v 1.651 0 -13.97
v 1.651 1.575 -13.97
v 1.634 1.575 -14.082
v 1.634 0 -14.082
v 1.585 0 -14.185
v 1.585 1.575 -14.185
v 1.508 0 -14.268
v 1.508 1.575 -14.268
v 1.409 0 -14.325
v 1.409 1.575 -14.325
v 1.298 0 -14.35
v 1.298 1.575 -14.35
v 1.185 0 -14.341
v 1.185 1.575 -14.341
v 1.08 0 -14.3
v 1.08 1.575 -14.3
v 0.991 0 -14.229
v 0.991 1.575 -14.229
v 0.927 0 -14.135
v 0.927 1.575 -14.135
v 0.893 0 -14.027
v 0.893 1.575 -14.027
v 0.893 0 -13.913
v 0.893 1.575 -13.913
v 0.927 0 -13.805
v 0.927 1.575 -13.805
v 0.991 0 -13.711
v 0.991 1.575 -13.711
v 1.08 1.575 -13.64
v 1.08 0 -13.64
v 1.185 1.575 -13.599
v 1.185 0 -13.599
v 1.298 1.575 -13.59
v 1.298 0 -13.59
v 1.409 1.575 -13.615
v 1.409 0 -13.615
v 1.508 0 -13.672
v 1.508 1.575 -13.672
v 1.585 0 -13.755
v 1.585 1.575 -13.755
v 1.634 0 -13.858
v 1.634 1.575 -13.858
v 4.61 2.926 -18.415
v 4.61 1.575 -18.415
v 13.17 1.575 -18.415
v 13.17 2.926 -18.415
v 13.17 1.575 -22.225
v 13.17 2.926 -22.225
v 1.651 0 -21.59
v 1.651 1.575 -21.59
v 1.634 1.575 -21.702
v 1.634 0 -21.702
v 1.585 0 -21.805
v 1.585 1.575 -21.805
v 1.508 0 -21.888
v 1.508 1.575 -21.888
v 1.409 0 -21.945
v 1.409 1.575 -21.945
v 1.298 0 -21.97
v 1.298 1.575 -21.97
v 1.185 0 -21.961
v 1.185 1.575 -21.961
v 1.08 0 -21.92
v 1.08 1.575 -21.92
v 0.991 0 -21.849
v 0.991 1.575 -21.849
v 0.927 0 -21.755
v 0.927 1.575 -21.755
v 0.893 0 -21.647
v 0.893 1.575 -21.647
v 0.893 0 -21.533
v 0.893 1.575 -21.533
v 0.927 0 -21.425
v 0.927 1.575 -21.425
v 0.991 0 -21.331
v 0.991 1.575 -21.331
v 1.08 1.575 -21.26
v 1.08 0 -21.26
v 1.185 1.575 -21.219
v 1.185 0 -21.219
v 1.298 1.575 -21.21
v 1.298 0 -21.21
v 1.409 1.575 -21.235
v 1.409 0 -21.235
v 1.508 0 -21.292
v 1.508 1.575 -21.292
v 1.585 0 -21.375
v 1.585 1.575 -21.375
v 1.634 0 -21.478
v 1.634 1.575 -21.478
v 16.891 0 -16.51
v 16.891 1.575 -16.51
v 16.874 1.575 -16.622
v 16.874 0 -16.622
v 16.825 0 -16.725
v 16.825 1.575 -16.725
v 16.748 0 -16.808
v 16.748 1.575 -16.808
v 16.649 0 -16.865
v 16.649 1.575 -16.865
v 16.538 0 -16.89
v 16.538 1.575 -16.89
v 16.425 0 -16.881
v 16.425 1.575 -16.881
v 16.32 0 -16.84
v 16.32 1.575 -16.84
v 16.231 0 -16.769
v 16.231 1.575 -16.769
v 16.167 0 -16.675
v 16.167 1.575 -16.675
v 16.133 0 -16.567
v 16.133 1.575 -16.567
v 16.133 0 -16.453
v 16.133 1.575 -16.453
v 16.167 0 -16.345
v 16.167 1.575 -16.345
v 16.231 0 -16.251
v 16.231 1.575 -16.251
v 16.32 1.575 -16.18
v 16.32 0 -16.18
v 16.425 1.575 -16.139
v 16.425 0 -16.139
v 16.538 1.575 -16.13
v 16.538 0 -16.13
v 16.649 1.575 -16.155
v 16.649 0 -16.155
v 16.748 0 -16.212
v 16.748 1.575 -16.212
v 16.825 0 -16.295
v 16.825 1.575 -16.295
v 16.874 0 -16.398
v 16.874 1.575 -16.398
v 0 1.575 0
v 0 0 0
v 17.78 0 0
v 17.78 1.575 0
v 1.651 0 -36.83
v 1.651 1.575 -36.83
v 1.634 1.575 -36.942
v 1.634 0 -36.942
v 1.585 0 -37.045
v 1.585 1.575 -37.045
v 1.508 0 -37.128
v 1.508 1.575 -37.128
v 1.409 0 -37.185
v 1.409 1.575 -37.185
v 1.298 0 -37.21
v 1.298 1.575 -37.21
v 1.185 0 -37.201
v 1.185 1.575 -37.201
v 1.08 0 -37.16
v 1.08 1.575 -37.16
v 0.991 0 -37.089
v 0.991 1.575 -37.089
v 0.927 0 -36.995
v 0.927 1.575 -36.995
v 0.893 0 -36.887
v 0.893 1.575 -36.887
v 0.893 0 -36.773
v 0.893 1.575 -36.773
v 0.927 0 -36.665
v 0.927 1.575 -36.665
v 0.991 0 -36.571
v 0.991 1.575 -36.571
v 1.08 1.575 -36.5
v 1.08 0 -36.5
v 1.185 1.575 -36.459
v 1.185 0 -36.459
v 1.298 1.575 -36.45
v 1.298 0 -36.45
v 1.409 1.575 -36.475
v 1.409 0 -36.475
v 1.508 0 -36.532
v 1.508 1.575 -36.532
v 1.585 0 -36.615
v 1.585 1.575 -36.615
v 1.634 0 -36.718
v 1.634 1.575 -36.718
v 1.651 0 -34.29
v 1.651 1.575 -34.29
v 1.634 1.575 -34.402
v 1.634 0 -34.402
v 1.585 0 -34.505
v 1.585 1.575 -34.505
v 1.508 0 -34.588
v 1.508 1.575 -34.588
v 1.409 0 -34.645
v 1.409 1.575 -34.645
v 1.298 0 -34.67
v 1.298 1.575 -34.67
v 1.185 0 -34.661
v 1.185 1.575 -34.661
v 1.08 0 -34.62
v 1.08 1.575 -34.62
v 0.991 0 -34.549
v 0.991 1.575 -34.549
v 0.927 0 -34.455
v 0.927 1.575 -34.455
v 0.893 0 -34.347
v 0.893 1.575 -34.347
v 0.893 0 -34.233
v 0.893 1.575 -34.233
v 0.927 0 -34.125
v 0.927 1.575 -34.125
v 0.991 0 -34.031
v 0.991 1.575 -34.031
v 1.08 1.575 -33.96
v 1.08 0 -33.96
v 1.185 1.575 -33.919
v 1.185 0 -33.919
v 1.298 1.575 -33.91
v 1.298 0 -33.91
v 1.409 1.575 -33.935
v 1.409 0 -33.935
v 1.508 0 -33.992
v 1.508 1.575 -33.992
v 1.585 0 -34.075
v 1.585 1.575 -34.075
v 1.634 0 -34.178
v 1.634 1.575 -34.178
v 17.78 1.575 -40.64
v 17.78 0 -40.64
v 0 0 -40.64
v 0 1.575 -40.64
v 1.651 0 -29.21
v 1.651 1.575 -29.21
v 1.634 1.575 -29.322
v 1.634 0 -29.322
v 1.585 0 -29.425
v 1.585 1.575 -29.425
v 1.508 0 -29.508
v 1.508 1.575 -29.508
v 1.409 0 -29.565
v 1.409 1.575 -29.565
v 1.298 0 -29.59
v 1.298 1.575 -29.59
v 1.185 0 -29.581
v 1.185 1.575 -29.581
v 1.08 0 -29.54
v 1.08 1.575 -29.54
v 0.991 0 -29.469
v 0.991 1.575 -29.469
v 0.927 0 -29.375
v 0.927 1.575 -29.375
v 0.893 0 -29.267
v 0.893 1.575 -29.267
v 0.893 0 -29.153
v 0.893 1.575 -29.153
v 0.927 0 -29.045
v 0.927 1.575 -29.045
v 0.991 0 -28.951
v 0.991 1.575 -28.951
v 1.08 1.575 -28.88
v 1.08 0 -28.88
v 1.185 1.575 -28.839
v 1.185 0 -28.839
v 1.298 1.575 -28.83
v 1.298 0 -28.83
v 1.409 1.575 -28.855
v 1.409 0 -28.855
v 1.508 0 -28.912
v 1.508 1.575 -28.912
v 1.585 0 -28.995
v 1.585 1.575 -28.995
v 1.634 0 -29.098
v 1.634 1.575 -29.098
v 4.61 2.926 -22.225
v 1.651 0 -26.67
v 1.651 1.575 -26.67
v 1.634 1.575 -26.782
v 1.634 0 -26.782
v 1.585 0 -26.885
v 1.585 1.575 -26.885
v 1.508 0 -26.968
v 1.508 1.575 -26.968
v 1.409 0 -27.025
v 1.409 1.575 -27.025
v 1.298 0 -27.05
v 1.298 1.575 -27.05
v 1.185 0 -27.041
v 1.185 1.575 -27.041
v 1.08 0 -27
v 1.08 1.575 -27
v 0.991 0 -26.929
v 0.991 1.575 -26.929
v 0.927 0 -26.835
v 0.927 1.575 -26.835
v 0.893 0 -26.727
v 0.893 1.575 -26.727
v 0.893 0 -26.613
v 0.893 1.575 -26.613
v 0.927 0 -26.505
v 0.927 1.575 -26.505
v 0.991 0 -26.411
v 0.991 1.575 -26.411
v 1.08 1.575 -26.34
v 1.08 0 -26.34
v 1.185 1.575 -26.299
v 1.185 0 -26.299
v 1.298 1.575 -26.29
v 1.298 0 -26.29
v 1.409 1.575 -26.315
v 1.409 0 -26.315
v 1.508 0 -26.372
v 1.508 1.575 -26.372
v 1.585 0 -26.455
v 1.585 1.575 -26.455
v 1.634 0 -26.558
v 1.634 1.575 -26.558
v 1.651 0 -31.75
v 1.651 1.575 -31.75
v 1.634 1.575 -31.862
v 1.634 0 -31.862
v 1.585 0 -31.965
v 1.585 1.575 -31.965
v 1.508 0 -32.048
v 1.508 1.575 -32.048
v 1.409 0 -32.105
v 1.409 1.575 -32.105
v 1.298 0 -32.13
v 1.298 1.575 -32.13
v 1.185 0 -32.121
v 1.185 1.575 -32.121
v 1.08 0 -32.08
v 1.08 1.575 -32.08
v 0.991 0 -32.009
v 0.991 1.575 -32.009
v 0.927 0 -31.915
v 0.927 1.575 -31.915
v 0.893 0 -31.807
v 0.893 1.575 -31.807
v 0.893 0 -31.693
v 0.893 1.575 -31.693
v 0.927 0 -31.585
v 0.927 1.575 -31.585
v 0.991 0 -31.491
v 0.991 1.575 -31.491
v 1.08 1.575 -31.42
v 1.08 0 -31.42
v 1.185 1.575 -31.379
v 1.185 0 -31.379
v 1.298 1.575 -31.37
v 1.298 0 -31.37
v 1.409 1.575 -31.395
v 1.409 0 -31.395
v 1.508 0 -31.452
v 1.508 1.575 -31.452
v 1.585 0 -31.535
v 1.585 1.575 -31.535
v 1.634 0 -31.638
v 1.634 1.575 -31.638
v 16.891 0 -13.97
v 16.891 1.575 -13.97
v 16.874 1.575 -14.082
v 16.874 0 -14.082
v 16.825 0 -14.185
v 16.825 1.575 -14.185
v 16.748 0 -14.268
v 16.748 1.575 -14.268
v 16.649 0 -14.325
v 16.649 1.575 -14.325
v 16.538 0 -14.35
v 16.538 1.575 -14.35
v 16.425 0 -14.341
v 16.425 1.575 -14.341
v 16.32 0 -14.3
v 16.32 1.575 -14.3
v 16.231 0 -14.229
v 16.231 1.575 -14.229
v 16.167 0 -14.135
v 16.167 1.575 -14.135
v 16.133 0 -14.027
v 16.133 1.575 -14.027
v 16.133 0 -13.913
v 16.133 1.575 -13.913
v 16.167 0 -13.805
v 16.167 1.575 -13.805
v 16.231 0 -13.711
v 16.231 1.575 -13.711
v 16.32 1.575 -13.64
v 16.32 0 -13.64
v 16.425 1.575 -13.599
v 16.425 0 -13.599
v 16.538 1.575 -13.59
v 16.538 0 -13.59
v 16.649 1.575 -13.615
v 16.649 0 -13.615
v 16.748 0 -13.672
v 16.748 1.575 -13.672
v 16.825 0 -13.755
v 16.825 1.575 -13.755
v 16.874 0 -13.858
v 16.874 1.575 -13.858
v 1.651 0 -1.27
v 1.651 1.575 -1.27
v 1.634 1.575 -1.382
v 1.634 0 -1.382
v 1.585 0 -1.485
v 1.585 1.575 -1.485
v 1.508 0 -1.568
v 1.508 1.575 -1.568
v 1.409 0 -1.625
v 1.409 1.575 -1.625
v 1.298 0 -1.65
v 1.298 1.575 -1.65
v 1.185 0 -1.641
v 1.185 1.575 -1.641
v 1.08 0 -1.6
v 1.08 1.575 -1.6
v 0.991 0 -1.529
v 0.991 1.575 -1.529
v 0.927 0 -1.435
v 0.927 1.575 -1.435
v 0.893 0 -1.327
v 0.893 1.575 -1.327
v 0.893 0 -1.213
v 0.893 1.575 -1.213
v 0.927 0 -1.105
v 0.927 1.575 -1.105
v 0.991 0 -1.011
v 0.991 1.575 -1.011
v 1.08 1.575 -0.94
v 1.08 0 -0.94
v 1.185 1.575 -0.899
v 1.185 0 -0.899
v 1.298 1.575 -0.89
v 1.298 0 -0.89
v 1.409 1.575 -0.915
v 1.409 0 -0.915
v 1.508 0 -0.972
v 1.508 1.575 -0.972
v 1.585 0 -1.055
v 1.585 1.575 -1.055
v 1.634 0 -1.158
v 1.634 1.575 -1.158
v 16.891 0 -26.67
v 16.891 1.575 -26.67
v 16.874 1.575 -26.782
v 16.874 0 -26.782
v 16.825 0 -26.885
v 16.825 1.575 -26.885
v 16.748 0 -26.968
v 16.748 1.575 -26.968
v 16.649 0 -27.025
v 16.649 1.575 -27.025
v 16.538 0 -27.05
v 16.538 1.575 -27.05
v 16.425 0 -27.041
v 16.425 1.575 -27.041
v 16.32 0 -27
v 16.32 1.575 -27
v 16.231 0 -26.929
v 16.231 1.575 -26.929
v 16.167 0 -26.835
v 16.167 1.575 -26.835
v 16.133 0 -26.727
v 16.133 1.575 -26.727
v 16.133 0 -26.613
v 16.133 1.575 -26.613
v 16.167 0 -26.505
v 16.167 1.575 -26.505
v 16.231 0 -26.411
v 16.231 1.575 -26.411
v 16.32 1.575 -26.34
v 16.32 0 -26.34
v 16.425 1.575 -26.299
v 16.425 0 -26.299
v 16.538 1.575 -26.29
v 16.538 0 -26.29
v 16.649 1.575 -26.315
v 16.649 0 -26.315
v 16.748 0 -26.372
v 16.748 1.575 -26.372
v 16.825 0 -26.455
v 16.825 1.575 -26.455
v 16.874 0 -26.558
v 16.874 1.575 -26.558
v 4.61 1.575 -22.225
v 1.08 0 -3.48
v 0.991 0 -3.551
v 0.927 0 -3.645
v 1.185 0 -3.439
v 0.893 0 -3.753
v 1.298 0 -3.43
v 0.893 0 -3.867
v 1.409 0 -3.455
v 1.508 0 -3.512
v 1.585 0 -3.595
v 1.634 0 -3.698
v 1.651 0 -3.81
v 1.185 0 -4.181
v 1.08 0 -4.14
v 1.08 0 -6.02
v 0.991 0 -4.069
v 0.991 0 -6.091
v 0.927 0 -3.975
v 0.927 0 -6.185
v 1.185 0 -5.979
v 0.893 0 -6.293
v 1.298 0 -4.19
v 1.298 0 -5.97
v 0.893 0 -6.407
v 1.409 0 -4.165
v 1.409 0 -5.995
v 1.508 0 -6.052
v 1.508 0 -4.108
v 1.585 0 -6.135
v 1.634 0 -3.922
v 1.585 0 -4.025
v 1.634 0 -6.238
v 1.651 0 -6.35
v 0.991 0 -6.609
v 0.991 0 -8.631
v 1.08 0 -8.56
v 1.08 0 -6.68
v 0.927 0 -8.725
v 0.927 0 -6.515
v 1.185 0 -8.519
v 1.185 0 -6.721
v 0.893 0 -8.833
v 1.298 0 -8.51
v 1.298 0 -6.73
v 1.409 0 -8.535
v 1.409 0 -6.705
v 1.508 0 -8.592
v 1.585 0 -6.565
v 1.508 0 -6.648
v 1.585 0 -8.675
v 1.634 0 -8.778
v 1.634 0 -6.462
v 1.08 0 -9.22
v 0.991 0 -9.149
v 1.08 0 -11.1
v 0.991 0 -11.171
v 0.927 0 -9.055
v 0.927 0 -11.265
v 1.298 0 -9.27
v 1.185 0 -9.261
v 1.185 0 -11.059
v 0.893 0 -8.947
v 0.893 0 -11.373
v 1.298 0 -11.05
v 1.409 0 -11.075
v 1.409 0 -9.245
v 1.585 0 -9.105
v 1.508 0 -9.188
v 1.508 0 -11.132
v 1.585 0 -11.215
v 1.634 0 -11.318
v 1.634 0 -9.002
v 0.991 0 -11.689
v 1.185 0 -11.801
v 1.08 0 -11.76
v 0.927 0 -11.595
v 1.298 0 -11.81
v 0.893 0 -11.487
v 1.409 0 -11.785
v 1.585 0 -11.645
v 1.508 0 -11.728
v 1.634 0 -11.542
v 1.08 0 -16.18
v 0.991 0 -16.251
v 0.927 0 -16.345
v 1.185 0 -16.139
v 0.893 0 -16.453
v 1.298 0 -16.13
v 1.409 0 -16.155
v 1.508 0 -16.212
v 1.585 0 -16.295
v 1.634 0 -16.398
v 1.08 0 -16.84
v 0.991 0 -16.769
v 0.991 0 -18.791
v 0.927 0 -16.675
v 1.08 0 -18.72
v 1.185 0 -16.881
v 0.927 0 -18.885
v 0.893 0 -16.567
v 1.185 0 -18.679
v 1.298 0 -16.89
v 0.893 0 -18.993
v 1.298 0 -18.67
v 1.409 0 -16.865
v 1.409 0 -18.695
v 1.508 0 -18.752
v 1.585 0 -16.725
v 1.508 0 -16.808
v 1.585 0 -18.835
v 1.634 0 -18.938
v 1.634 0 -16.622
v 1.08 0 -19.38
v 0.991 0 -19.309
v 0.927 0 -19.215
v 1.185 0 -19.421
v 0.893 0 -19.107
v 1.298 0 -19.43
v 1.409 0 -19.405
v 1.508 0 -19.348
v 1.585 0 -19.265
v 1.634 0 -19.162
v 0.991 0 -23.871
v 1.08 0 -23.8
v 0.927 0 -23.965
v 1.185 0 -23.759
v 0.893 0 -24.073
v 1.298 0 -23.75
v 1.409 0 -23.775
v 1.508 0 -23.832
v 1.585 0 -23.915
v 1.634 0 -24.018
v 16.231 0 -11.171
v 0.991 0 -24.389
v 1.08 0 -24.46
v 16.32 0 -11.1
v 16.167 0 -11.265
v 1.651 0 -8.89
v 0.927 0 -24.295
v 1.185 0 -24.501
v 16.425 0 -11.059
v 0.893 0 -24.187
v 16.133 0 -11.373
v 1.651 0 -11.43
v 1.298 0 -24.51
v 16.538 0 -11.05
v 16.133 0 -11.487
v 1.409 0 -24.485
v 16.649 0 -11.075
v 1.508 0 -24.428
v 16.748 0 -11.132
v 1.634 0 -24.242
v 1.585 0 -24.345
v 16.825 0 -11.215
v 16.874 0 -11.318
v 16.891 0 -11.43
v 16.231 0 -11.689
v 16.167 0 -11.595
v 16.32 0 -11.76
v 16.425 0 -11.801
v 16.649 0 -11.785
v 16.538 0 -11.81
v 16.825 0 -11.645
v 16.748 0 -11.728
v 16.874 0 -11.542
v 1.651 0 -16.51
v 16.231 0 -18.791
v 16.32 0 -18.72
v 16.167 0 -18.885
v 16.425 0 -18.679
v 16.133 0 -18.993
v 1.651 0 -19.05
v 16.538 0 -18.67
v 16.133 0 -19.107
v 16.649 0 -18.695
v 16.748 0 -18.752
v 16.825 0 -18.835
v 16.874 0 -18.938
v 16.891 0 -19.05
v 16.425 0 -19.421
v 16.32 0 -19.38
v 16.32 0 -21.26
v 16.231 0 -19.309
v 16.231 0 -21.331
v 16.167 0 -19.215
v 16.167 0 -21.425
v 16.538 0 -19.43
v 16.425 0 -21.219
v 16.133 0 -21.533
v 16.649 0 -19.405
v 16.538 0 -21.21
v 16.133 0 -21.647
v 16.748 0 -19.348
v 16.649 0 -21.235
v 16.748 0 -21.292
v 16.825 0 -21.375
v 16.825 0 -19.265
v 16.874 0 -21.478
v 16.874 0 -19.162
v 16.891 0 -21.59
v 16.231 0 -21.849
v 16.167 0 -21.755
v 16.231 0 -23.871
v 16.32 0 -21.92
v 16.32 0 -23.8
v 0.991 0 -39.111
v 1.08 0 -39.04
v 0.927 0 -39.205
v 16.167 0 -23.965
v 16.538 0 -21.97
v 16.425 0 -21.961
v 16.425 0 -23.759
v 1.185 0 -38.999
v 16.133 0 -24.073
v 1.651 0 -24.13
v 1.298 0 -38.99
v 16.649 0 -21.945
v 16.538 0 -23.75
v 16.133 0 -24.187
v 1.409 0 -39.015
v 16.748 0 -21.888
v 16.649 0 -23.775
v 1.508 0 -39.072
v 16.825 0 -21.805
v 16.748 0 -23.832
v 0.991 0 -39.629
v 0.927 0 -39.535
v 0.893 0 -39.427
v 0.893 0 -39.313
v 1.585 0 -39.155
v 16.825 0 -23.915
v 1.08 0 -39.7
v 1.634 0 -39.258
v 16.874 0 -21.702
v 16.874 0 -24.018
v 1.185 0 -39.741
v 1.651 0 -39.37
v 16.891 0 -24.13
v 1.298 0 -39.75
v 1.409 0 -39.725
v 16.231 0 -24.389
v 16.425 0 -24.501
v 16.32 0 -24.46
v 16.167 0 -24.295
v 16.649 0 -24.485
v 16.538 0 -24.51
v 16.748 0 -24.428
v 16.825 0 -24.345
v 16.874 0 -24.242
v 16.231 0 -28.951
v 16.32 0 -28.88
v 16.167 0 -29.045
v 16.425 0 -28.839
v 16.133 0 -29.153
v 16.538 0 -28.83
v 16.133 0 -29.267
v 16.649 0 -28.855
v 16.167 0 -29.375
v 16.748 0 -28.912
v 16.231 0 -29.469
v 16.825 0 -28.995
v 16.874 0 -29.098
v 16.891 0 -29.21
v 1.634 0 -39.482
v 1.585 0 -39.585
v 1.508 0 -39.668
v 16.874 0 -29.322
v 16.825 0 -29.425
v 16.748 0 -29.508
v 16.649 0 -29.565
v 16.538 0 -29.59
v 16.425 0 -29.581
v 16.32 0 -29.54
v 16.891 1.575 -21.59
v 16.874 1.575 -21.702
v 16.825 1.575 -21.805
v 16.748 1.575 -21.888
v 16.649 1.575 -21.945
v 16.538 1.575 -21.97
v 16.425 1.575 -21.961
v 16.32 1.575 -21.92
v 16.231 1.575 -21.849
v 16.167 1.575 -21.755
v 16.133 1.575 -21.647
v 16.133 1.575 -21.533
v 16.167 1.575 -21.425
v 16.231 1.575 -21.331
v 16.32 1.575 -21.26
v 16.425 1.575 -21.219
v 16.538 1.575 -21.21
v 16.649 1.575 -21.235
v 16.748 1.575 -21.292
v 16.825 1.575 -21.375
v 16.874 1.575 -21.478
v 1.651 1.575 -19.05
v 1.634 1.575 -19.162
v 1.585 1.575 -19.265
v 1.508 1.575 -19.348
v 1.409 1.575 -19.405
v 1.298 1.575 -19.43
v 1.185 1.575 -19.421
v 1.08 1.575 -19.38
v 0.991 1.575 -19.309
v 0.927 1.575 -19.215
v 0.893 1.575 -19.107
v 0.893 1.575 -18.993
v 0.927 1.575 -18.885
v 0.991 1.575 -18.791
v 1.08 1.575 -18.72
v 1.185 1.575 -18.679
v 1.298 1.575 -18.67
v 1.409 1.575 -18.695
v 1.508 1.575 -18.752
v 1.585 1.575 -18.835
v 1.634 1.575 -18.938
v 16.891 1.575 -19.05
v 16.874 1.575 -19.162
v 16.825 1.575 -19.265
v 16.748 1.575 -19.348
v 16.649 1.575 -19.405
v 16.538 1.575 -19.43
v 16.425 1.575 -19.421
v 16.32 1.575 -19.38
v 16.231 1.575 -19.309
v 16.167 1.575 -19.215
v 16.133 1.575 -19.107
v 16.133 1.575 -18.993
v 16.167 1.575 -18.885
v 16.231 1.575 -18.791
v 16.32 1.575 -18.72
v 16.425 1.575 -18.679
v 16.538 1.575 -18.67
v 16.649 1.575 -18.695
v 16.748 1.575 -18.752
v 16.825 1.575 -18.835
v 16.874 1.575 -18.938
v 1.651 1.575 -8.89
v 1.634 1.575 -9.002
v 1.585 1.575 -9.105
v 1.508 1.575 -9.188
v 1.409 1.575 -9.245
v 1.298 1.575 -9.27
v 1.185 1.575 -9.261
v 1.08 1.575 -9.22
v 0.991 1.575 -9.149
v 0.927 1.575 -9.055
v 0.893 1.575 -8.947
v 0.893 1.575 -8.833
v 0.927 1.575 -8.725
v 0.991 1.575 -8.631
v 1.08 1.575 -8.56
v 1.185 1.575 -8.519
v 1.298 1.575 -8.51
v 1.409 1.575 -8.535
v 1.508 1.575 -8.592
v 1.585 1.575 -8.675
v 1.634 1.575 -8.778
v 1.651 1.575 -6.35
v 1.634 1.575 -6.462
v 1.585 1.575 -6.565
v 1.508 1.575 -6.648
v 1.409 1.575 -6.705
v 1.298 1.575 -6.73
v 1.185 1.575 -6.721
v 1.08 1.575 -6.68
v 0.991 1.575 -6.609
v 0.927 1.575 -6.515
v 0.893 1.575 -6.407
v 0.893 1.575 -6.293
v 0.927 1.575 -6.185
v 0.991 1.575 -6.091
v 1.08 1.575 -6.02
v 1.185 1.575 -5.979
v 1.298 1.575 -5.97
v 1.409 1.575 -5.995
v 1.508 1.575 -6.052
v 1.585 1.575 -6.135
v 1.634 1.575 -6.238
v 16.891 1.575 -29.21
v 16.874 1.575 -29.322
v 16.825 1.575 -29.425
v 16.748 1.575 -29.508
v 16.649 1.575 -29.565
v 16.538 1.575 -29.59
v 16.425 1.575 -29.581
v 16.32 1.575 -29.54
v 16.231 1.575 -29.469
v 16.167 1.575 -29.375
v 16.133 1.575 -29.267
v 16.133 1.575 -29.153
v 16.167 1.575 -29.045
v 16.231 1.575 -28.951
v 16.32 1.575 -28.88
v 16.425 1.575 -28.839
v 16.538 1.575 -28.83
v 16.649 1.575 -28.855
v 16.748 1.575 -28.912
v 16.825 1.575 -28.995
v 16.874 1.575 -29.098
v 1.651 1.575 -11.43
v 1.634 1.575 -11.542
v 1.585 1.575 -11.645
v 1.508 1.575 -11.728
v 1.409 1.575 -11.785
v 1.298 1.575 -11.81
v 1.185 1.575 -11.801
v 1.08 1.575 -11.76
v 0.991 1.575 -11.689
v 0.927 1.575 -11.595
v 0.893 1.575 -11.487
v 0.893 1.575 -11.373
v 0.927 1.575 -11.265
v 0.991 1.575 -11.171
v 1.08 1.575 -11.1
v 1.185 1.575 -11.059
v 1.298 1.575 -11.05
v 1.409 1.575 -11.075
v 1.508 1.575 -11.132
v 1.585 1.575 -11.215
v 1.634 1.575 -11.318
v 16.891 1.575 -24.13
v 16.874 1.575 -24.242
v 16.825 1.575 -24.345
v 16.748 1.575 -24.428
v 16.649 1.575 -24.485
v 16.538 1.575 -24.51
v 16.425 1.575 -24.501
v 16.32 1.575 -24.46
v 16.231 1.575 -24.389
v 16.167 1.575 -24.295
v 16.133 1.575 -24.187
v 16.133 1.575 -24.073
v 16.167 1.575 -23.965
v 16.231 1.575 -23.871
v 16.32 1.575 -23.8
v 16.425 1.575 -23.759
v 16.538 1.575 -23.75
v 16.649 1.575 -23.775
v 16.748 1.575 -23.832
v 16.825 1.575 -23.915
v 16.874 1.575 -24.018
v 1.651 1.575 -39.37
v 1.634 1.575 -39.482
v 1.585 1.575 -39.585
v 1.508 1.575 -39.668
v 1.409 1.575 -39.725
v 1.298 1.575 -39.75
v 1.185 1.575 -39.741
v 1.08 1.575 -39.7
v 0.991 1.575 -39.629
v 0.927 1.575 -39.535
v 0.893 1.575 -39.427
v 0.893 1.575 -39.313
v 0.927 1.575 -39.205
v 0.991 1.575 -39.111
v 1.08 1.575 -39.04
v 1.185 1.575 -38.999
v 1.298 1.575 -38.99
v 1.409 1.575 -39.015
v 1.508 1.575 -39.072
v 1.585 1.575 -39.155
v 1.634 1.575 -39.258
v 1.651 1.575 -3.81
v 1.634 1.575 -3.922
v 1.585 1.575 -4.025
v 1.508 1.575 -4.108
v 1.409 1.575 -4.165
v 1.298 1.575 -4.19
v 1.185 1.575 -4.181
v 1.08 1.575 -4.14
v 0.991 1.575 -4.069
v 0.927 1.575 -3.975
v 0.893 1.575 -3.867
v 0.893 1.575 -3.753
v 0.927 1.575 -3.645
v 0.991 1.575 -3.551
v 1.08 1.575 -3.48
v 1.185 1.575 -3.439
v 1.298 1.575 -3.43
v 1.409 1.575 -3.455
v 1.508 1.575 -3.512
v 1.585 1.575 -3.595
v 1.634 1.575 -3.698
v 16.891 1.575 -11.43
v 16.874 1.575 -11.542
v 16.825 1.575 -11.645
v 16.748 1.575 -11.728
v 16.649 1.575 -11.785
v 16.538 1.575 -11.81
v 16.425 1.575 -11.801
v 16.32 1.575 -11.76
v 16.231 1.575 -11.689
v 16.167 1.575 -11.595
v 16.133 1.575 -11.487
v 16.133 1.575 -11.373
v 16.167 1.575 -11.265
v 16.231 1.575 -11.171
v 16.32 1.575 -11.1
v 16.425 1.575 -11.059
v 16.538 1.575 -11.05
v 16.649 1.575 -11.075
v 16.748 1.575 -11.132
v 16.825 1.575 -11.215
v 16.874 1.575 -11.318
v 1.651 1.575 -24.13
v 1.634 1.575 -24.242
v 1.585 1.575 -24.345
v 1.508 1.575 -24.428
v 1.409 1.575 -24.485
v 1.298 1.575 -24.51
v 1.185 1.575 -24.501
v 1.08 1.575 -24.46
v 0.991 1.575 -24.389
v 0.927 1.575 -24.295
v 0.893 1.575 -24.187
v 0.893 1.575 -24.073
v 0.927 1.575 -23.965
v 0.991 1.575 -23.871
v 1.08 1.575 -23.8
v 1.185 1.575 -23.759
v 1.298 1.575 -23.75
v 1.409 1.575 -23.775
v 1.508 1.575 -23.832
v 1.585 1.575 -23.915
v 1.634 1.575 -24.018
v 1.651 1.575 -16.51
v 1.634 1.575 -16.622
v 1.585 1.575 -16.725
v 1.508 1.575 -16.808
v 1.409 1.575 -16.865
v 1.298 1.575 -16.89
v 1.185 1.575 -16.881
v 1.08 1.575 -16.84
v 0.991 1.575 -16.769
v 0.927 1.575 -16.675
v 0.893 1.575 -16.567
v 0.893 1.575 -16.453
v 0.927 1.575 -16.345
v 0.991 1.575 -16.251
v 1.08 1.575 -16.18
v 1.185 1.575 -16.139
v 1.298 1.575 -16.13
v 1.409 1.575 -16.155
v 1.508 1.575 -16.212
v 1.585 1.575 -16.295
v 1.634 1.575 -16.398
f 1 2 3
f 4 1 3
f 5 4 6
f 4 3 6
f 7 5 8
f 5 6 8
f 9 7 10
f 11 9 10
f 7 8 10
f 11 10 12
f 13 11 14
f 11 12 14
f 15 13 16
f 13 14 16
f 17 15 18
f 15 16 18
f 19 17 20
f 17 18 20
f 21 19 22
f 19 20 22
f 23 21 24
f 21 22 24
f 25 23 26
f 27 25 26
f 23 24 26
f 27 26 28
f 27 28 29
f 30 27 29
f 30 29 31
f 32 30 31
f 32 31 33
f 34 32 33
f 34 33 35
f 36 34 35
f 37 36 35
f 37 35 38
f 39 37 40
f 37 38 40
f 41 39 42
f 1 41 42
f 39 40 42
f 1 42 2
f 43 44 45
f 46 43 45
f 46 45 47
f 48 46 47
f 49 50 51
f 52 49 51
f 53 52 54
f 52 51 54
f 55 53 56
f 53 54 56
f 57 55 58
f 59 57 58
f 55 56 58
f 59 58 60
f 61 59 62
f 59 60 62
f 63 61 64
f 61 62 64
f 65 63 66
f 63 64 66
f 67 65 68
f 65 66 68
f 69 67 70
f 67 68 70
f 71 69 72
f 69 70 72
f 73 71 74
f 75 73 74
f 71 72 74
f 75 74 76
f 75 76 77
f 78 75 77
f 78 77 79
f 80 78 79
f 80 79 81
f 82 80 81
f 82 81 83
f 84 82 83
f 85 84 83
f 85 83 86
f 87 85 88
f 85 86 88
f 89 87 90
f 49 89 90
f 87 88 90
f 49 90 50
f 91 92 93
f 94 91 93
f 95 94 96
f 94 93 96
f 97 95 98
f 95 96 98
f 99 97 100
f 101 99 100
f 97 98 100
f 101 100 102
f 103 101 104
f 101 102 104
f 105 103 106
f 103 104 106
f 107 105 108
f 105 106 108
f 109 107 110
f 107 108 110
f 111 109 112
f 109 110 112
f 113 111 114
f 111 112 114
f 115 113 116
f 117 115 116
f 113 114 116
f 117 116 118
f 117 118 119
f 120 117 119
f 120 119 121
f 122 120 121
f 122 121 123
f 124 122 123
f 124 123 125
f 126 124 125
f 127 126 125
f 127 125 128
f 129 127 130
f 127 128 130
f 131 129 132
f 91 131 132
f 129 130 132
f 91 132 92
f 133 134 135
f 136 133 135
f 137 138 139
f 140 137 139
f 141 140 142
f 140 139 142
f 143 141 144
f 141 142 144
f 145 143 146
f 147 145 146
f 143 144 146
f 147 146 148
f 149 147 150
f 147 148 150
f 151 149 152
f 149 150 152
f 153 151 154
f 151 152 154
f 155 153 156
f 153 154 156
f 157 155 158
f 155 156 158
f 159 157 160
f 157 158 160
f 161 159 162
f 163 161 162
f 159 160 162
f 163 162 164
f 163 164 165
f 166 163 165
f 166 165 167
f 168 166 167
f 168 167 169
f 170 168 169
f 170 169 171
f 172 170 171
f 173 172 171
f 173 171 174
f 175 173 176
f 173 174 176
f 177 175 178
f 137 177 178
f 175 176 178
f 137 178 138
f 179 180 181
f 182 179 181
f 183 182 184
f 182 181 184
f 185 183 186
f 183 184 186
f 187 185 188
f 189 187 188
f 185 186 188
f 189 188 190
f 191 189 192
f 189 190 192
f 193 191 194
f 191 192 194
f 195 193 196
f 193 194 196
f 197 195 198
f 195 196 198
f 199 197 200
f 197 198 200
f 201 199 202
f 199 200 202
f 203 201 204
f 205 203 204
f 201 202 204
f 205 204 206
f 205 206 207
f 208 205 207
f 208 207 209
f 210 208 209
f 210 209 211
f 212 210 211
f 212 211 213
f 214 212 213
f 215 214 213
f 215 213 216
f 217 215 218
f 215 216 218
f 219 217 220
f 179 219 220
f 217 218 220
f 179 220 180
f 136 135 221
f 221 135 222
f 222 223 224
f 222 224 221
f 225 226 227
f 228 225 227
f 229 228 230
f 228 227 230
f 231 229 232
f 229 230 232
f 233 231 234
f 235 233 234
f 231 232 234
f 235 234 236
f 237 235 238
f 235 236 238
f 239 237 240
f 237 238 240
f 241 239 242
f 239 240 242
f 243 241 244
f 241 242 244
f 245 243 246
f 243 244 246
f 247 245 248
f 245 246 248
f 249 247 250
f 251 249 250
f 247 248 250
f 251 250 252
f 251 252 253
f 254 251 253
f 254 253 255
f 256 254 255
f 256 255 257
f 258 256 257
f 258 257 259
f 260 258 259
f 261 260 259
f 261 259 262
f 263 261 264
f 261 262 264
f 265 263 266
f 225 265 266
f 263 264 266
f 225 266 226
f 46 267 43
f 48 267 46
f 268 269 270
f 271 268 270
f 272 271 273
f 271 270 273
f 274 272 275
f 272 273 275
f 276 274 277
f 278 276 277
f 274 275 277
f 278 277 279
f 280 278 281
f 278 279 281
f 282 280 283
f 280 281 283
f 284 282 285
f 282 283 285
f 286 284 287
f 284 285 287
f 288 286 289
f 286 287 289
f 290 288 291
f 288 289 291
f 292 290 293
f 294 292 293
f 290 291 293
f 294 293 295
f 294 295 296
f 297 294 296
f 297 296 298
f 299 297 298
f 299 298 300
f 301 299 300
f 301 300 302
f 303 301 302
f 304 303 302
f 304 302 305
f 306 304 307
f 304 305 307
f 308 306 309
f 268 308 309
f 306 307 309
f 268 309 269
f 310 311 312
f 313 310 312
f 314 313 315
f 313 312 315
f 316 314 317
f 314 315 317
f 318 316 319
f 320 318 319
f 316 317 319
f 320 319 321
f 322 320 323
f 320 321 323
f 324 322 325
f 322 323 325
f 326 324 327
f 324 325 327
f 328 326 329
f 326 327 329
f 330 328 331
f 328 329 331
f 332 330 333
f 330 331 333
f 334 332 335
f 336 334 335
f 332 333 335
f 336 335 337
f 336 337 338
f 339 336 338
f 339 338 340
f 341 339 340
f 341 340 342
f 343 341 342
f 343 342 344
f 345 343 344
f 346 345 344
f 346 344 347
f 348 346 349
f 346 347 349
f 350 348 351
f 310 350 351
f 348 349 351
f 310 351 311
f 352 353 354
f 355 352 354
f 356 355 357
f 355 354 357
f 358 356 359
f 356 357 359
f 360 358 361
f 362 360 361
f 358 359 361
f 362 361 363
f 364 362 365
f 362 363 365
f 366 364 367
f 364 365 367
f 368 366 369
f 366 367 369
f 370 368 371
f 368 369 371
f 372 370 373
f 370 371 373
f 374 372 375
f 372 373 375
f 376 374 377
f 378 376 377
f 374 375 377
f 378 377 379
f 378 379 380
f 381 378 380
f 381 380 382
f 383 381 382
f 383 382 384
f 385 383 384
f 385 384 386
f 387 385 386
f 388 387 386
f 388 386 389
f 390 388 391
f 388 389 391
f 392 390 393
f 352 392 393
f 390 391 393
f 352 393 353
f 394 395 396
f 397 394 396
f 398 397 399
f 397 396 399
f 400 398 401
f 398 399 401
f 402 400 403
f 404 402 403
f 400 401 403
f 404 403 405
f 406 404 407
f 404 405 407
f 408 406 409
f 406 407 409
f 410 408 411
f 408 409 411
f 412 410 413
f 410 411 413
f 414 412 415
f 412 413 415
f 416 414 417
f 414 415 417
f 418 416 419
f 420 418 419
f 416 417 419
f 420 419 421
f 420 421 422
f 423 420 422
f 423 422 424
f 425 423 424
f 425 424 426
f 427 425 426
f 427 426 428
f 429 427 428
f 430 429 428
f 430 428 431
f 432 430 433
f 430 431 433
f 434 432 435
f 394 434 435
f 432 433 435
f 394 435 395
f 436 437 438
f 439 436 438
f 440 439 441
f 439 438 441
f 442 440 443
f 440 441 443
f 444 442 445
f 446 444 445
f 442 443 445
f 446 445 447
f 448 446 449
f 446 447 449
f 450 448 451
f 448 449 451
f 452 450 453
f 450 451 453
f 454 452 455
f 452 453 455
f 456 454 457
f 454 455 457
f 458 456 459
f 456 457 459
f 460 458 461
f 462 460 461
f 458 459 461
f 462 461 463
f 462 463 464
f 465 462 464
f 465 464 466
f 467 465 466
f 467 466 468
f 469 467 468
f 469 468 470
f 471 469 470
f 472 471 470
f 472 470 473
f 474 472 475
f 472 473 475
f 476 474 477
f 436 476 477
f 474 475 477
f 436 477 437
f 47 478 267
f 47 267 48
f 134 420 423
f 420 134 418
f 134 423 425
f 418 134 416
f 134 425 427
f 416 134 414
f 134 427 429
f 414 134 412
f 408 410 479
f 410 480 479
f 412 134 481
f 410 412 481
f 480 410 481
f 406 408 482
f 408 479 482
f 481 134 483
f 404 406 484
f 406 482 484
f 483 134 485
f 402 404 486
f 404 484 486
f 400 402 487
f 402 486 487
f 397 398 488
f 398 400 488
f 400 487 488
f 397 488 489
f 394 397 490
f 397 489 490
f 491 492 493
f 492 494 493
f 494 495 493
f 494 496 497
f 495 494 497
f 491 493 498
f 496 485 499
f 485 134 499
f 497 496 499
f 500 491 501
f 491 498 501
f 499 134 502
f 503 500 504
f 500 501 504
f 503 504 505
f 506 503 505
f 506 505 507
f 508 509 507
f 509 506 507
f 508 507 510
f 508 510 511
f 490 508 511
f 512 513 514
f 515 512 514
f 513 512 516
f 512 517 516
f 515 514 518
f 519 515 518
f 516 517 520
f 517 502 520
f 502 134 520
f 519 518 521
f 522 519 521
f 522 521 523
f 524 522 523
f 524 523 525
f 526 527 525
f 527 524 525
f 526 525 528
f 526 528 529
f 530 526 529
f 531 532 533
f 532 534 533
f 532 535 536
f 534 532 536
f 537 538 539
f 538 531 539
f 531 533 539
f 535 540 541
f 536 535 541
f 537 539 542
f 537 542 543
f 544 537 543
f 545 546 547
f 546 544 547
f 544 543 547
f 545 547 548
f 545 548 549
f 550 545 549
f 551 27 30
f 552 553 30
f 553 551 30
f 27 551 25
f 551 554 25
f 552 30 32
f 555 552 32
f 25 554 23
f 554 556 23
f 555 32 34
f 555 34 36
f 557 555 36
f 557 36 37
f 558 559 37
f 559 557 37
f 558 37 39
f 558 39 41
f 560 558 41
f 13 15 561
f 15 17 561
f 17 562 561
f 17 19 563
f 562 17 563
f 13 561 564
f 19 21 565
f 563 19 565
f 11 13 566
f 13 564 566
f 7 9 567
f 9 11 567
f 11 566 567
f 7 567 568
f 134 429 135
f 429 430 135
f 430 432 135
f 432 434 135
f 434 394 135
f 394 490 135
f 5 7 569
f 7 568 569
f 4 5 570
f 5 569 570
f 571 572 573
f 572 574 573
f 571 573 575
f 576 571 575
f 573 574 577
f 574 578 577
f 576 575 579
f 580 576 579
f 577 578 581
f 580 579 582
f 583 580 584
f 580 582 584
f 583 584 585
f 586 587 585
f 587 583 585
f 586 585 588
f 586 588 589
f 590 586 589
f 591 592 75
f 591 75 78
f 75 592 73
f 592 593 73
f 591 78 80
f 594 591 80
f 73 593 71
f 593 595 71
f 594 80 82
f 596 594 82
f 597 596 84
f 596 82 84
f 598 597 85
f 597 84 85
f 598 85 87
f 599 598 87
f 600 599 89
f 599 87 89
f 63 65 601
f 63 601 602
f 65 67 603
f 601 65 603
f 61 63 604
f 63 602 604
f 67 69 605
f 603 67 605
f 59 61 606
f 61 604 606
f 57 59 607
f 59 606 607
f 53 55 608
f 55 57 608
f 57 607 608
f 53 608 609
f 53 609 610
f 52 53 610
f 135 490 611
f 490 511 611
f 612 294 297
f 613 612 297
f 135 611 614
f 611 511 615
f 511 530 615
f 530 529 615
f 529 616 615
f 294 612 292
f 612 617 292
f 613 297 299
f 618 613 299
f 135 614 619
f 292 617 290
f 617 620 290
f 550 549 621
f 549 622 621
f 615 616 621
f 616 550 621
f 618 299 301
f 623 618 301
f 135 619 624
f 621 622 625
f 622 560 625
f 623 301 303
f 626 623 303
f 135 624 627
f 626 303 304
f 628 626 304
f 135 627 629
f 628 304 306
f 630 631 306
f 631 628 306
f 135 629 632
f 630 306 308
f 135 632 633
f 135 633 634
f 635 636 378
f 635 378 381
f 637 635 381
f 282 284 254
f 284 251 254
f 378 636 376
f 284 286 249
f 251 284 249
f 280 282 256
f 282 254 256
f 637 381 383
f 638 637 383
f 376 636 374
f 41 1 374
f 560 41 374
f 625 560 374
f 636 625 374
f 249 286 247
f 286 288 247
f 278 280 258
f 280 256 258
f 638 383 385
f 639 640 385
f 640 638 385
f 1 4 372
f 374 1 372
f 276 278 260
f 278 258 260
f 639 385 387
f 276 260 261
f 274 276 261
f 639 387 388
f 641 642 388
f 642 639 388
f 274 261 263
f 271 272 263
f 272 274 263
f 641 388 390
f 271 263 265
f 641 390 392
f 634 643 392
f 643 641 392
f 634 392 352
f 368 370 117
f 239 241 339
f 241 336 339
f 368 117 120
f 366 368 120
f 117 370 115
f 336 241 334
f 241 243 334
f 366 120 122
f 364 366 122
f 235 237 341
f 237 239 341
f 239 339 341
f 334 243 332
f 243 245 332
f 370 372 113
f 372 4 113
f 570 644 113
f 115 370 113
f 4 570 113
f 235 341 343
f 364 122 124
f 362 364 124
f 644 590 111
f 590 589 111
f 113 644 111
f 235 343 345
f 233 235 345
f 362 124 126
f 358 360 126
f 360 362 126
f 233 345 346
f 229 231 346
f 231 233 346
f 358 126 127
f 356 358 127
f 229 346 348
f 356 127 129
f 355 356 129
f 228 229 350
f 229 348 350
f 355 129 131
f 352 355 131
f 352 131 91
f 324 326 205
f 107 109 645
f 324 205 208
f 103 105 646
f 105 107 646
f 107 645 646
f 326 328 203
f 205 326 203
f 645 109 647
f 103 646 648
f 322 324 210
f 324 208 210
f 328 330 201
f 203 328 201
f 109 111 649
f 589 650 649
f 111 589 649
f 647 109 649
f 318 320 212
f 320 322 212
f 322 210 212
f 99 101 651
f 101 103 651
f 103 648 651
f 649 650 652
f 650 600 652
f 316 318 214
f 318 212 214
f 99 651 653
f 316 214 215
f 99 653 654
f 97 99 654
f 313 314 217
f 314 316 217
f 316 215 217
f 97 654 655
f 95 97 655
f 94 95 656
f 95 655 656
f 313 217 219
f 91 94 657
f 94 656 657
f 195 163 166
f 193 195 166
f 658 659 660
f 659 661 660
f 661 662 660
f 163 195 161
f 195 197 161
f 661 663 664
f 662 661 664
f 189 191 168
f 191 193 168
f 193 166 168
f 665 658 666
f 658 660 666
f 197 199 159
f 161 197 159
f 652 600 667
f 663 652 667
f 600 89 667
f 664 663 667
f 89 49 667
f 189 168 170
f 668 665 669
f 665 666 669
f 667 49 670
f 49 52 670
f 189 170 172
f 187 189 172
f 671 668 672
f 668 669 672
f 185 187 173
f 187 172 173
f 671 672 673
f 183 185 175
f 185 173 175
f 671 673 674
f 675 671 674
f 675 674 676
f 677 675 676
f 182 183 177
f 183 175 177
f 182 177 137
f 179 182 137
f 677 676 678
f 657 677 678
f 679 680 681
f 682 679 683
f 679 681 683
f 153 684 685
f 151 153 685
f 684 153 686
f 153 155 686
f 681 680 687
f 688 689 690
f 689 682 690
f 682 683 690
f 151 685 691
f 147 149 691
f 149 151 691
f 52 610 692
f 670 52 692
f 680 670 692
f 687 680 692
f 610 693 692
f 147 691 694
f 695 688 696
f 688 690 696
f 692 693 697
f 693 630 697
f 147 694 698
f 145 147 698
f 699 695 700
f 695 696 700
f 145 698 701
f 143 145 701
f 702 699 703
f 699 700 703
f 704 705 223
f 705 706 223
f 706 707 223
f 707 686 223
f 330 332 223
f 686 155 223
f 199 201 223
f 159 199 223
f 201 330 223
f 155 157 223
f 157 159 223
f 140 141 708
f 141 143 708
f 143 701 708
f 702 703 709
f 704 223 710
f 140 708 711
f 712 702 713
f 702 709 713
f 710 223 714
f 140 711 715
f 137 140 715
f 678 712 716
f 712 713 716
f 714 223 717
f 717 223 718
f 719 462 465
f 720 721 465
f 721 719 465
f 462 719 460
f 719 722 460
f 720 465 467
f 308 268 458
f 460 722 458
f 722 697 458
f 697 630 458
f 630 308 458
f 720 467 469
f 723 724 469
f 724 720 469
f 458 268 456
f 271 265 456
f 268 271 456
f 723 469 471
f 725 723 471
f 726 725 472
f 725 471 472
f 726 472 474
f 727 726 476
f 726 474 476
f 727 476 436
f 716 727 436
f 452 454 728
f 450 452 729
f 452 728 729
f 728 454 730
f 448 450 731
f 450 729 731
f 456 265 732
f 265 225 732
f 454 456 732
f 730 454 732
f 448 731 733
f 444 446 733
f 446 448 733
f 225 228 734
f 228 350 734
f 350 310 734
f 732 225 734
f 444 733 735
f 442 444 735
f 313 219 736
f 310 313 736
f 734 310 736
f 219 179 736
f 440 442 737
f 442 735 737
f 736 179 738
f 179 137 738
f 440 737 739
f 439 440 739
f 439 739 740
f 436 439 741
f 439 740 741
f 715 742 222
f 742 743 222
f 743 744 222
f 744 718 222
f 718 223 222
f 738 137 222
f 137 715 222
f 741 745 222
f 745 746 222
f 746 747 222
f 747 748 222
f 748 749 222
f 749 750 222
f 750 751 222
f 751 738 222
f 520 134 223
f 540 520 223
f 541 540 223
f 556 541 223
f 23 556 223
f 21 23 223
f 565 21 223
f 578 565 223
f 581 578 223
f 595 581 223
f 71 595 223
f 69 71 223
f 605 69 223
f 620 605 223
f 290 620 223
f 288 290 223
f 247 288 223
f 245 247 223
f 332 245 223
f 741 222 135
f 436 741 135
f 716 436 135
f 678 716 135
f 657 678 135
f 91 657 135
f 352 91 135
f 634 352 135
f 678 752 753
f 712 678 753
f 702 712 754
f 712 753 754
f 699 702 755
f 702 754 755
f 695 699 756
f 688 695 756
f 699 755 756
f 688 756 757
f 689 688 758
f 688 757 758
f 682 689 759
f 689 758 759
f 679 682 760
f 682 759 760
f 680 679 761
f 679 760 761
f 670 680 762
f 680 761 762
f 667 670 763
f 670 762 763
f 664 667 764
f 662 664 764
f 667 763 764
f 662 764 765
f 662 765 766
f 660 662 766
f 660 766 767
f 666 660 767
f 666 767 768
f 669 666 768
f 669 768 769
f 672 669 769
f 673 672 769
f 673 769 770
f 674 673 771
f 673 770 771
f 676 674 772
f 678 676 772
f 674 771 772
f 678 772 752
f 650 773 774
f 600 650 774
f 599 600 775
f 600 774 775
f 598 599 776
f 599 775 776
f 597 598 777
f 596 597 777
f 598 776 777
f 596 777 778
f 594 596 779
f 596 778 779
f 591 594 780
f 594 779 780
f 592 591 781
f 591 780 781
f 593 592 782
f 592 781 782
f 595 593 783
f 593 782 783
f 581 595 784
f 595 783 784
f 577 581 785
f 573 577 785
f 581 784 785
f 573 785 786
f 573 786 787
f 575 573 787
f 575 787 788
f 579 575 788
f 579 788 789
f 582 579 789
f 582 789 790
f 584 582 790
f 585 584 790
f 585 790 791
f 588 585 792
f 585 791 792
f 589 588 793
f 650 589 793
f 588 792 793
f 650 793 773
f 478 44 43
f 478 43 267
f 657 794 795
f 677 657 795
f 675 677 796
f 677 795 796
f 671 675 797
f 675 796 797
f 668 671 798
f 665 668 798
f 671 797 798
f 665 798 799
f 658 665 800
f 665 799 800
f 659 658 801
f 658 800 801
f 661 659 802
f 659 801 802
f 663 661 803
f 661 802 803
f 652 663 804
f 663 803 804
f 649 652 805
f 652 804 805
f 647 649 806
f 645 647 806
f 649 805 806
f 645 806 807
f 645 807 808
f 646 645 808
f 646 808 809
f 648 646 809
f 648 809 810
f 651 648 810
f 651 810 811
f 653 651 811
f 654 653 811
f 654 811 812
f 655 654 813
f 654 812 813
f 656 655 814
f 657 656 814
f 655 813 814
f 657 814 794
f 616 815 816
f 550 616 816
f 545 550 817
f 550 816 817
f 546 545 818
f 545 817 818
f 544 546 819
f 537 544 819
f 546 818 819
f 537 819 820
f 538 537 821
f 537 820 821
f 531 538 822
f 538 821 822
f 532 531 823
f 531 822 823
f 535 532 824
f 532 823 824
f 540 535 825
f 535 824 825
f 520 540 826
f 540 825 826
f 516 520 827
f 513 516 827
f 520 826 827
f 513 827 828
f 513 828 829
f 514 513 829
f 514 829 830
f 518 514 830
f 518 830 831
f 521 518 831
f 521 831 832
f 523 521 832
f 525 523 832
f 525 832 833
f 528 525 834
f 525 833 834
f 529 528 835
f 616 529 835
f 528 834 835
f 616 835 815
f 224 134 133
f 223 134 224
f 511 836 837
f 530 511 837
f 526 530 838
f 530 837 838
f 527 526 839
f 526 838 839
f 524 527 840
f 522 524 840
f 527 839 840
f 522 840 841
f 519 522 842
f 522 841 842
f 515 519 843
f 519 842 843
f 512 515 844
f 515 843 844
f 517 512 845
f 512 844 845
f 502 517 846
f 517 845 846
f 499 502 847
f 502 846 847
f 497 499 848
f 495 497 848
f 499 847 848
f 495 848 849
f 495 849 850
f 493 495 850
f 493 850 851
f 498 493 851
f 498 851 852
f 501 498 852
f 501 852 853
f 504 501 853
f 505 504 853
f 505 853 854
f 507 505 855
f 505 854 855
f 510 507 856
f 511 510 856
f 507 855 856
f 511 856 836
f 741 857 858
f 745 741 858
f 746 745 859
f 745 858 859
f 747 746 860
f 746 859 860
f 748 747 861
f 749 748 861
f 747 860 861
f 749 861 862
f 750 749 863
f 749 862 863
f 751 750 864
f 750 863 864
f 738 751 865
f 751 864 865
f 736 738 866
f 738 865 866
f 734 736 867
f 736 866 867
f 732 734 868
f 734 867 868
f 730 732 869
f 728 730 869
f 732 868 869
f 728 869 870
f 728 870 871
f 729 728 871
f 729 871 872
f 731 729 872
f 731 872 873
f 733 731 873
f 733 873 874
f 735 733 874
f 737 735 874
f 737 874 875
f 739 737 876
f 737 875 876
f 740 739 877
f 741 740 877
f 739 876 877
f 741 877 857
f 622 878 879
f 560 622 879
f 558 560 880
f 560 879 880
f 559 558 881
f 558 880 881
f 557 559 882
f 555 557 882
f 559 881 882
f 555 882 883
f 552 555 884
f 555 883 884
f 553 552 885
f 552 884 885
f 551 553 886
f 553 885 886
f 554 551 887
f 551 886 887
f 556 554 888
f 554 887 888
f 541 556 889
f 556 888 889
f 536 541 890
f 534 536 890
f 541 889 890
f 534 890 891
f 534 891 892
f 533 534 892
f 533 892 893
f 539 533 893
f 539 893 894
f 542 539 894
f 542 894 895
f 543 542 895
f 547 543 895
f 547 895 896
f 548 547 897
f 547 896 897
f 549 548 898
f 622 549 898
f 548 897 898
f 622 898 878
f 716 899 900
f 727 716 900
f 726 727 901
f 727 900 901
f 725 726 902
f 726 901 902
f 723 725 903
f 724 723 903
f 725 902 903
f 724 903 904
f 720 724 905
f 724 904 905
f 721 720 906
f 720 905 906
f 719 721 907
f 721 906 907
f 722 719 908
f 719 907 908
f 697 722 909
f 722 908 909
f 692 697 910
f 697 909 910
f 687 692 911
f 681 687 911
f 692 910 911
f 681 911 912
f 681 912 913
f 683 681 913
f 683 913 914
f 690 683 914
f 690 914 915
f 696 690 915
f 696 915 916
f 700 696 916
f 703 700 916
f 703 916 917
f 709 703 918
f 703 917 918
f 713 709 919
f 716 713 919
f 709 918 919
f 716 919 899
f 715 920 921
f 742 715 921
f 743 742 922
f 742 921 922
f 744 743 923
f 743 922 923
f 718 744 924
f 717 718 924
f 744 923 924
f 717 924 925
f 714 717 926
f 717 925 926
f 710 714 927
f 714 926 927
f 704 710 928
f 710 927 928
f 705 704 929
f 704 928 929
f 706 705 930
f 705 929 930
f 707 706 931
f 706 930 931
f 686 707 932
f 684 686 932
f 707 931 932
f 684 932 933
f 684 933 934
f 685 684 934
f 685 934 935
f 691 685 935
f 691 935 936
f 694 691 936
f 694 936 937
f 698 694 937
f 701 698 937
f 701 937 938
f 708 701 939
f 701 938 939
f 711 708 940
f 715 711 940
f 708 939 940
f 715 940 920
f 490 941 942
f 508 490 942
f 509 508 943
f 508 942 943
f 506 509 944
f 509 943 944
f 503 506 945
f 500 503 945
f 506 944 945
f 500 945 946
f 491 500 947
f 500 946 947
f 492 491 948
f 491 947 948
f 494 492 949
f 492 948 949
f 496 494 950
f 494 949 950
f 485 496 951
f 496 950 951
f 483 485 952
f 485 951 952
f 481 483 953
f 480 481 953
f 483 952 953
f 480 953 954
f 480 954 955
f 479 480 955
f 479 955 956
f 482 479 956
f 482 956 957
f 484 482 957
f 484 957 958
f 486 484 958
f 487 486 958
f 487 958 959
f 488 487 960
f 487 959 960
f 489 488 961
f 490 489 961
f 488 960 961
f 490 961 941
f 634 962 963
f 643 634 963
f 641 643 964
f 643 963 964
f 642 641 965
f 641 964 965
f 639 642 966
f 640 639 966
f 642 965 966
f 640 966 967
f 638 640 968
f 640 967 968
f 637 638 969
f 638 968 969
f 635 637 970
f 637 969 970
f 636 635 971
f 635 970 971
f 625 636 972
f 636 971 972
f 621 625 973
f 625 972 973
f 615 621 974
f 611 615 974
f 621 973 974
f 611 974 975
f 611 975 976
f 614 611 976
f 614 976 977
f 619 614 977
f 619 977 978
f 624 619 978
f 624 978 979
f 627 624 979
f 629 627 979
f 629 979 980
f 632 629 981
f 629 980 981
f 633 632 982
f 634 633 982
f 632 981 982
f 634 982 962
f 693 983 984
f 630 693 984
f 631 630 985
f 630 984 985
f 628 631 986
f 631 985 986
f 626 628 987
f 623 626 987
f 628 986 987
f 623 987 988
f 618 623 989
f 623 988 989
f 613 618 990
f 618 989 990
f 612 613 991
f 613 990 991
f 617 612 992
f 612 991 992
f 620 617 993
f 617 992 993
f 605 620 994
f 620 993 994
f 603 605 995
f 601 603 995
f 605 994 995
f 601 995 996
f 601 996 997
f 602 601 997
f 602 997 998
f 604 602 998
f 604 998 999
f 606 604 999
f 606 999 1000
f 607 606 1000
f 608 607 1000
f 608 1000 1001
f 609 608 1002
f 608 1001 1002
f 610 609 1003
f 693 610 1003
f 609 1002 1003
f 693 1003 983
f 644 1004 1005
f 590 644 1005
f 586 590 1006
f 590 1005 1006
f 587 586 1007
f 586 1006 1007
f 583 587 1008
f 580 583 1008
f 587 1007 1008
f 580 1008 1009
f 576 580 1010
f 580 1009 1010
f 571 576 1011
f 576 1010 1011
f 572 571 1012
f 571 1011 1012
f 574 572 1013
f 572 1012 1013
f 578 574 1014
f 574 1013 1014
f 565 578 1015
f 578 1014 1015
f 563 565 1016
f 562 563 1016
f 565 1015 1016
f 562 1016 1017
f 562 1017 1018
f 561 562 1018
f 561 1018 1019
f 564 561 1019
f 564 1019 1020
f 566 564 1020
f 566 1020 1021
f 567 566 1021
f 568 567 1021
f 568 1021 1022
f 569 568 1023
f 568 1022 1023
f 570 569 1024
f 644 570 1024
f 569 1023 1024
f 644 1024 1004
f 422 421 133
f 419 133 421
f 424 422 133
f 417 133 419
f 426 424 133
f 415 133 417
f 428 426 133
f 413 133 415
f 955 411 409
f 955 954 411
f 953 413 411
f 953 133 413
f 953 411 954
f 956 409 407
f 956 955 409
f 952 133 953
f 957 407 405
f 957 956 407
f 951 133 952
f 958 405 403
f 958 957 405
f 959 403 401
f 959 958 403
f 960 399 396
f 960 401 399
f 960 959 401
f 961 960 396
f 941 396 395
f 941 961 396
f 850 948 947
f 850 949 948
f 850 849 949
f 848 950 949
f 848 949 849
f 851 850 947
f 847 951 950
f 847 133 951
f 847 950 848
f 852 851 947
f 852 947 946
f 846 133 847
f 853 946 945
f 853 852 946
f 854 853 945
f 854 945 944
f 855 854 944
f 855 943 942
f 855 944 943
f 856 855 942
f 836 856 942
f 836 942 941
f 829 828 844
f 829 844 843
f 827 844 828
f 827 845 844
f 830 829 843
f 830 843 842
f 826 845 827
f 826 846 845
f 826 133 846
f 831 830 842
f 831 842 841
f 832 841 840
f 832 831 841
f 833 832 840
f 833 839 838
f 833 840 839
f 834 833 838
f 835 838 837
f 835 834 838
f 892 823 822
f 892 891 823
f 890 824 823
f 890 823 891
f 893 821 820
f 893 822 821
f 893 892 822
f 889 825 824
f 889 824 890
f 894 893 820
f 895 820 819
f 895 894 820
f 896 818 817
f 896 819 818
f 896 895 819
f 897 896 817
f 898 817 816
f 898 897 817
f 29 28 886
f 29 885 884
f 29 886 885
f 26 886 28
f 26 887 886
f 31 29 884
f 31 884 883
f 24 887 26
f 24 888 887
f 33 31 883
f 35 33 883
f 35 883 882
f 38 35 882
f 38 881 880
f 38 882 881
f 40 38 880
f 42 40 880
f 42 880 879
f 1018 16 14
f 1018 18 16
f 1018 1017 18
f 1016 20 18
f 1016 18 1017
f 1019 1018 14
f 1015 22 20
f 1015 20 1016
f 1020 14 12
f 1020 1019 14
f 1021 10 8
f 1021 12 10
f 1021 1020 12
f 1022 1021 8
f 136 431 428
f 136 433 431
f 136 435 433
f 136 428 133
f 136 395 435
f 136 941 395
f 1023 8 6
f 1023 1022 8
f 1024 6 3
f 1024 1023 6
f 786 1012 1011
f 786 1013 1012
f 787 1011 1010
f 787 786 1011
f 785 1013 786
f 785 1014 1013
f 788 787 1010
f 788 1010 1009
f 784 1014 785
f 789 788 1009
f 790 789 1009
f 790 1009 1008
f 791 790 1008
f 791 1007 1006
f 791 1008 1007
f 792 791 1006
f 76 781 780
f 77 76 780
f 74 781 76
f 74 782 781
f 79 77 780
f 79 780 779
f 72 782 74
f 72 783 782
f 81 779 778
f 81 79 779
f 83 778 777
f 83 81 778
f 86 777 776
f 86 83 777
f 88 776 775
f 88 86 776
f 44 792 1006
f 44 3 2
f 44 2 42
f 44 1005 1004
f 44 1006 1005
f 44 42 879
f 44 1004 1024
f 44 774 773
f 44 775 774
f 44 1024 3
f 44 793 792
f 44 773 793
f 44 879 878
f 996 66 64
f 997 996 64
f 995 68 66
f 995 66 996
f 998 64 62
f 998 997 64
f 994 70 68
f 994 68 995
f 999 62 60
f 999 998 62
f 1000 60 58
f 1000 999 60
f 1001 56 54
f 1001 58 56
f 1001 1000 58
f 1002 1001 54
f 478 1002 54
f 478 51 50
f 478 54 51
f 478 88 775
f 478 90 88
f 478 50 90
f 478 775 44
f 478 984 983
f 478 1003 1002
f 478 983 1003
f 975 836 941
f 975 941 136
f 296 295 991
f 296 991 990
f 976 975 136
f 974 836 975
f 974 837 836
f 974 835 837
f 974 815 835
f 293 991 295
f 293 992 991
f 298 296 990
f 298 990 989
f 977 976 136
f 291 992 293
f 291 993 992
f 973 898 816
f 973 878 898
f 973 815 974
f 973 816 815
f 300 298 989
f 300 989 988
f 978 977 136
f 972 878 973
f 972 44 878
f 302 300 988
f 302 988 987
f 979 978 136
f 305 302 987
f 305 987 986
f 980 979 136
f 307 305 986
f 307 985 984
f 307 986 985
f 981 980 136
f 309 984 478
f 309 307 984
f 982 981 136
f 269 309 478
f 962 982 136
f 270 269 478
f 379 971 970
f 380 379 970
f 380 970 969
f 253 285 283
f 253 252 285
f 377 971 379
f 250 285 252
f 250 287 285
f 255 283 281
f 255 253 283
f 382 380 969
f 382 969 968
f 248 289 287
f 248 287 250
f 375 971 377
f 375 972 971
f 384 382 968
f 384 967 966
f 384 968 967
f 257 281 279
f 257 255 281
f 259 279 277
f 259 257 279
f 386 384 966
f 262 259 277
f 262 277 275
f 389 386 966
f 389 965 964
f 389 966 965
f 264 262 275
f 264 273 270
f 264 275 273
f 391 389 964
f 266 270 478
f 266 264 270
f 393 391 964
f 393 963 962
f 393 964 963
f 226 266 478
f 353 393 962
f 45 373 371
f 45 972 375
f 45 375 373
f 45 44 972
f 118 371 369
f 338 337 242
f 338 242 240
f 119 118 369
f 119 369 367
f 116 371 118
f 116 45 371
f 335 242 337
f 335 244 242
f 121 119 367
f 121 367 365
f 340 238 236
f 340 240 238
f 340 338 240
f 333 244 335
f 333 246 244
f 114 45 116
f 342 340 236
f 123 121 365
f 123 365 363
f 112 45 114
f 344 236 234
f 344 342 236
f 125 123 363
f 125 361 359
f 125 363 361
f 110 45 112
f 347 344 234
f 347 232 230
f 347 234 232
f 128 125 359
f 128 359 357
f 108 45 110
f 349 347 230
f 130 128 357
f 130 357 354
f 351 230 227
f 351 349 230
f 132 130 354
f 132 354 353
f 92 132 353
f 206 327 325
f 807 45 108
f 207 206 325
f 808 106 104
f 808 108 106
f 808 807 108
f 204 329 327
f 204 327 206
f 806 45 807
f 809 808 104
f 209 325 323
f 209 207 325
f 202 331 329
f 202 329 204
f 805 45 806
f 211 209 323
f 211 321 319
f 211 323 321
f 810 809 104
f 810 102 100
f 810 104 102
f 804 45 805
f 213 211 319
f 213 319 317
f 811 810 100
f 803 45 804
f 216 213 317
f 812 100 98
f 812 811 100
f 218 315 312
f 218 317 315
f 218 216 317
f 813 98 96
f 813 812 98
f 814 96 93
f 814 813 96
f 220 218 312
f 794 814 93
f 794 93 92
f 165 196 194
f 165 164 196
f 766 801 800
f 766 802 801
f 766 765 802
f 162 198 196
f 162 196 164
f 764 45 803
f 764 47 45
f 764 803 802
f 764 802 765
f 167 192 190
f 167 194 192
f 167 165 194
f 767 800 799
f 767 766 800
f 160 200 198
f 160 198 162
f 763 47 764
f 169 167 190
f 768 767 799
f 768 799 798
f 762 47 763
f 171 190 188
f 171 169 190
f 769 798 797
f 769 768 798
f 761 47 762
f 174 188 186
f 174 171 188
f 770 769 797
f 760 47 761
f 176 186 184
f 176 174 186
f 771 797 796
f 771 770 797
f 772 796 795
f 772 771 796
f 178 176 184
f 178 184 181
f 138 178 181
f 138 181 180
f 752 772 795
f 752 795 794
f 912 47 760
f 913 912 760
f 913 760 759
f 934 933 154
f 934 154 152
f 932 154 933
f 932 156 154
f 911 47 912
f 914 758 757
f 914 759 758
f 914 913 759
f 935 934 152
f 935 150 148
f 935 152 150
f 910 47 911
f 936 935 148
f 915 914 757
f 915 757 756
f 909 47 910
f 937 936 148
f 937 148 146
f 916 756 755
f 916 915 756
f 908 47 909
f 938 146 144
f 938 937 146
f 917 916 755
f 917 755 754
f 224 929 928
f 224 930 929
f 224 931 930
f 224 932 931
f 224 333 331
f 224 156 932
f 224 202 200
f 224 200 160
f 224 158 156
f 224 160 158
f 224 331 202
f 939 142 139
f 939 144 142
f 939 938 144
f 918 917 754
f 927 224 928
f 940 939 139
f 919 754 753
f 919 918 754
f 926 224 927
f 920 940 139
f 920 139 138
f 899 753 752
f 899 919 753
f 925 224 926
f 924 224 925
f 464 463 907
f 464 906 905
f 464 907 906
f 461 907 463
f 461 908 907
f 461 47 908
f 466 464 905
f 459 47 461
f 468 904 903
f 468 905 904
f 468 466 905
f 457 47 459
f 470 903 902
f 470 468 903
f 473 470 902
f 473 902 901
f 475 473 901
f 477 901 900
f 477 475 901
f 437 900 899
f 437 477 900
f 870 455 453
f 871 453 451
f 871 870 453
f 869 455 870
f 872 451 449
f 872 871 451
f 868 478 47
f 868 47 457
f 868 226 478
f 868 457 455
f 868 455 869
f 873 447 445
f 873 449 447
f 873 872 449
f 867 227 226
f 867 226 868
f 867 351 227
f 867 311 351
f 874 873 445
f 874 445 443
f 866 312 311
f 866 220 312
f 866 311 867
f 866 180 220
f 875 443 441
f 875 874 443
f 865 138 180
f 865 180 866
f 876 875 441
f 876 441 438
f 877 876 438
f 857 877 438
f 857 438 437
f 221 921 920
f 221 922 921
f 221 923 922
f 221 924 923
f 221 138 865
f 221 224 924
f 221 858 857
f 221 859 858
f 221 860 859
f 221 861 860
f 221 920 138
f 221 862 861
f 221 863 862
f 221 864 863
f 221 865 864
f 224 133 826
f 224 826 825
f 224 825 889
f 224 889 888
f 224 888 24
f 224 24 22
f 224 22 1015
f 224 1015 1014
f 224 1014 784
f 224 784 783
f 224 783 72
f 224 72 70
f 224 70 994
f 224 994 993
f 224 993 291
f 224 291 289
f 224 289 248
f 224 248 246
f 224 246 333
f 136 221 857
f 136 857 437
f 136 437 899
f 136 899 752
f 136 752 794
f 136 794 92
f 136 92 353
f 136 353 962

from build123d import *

# Parameters (mm, degrees)
SKETCH1_W                 = 17.78
SKETCH1_H                 = 40.64
PCB_DEPTH                 = 1.5748
SKETCH2_R                 = 0.381
HOLE_PATTERN_SEED_1_DEPTH = 1.5748
HP_1X16_COUNT             = 16
HP_1X16_PITCH             = 2.54
SKETCH3_R                 = 0.381
HOLE_PATTERN_SEED_2_DEPTH = 1.5748
HP_1X08_COUNT             = 8
HP_1X08_PITCH             = 2.54
SKETCH4_W                 = 8.5598
SKETCH4_H                 = 3.81
SSOP_24_DEPTH             = 1.35128


with BuildPart() as part:
    # Sketch1 → PCB (new body)
    with BuildSketch(Plane(origin=(0, 0, 0), x_dir=(1, 0, 0), z_dir=(0, 1, 0))):
        with Locations((8.89, 20.32)):
            Rectangle(SKETCH1_W, SKETCH1_H)
    extrude(amount=PCB_DEPTH)

    # Sketch2 → Hole Pattern seed 1 (cut)
    with BuildSketch(Plane(origin=(0, 1.5748, 0), x_dir=(1, 0, 0), z_dir=(0, 1, 0))):
        with Locations((1.27, 1.27)):
            Circle(SKETCH2_R)
    hole_pattern_seed_1 = extrude(amount=-HOLE_PATTERN_SEED_1_DEPTH, mode=Mode.SUBTRACT)

    # HP 1x16: Hole Pattern seed 1 ×16
    with Locations(*[(0, 0, -i * HP_1X16_PITCH) for i in range(1, HP_1X16_COUNT)]):
        add(hole_pattern_seed_1, mode=Mode.SUBTRACT)

    # Sketch3 → Hole Pattern seed 2 (cut)
    with BuildSketch(Plane(origin=(0, 1.5748, 0), x_dir=(1, 0, 0), z_dir=(0, 1, 0))):
        with Locations((16.51, 11.43)):
            Circle(SKETCH3_R)
    hole_pattern_seed_2 = extrude(amount=-HOLE_PATTERN_SEED_2_DEPTH, mode=Mode.SUBTRACT)

    # HP 1x08: Hole Pattern seed 2 ×8
    with Locations(*[(0, 0, -i * HP_1X08_PITCH) for i in range(1, HP_1X08_COUNT)]):
        add(hole_pattern_seed_2, mode=Mode.SUBTRACT)

    # Sketch4 → SSOP-24 (add)
    with BuildSketch(Plane(origin=(0, 1.5748, 0), x_dir=(1, 0, 0), z_dir=(0, 1, 0))):
        with Locations((8.89, 20.32)):
            Rectangle(SKETCH4_W, SKETCH4_H)
    extrude(amount=SSOP_24_DEPTH)


solid = part.part
